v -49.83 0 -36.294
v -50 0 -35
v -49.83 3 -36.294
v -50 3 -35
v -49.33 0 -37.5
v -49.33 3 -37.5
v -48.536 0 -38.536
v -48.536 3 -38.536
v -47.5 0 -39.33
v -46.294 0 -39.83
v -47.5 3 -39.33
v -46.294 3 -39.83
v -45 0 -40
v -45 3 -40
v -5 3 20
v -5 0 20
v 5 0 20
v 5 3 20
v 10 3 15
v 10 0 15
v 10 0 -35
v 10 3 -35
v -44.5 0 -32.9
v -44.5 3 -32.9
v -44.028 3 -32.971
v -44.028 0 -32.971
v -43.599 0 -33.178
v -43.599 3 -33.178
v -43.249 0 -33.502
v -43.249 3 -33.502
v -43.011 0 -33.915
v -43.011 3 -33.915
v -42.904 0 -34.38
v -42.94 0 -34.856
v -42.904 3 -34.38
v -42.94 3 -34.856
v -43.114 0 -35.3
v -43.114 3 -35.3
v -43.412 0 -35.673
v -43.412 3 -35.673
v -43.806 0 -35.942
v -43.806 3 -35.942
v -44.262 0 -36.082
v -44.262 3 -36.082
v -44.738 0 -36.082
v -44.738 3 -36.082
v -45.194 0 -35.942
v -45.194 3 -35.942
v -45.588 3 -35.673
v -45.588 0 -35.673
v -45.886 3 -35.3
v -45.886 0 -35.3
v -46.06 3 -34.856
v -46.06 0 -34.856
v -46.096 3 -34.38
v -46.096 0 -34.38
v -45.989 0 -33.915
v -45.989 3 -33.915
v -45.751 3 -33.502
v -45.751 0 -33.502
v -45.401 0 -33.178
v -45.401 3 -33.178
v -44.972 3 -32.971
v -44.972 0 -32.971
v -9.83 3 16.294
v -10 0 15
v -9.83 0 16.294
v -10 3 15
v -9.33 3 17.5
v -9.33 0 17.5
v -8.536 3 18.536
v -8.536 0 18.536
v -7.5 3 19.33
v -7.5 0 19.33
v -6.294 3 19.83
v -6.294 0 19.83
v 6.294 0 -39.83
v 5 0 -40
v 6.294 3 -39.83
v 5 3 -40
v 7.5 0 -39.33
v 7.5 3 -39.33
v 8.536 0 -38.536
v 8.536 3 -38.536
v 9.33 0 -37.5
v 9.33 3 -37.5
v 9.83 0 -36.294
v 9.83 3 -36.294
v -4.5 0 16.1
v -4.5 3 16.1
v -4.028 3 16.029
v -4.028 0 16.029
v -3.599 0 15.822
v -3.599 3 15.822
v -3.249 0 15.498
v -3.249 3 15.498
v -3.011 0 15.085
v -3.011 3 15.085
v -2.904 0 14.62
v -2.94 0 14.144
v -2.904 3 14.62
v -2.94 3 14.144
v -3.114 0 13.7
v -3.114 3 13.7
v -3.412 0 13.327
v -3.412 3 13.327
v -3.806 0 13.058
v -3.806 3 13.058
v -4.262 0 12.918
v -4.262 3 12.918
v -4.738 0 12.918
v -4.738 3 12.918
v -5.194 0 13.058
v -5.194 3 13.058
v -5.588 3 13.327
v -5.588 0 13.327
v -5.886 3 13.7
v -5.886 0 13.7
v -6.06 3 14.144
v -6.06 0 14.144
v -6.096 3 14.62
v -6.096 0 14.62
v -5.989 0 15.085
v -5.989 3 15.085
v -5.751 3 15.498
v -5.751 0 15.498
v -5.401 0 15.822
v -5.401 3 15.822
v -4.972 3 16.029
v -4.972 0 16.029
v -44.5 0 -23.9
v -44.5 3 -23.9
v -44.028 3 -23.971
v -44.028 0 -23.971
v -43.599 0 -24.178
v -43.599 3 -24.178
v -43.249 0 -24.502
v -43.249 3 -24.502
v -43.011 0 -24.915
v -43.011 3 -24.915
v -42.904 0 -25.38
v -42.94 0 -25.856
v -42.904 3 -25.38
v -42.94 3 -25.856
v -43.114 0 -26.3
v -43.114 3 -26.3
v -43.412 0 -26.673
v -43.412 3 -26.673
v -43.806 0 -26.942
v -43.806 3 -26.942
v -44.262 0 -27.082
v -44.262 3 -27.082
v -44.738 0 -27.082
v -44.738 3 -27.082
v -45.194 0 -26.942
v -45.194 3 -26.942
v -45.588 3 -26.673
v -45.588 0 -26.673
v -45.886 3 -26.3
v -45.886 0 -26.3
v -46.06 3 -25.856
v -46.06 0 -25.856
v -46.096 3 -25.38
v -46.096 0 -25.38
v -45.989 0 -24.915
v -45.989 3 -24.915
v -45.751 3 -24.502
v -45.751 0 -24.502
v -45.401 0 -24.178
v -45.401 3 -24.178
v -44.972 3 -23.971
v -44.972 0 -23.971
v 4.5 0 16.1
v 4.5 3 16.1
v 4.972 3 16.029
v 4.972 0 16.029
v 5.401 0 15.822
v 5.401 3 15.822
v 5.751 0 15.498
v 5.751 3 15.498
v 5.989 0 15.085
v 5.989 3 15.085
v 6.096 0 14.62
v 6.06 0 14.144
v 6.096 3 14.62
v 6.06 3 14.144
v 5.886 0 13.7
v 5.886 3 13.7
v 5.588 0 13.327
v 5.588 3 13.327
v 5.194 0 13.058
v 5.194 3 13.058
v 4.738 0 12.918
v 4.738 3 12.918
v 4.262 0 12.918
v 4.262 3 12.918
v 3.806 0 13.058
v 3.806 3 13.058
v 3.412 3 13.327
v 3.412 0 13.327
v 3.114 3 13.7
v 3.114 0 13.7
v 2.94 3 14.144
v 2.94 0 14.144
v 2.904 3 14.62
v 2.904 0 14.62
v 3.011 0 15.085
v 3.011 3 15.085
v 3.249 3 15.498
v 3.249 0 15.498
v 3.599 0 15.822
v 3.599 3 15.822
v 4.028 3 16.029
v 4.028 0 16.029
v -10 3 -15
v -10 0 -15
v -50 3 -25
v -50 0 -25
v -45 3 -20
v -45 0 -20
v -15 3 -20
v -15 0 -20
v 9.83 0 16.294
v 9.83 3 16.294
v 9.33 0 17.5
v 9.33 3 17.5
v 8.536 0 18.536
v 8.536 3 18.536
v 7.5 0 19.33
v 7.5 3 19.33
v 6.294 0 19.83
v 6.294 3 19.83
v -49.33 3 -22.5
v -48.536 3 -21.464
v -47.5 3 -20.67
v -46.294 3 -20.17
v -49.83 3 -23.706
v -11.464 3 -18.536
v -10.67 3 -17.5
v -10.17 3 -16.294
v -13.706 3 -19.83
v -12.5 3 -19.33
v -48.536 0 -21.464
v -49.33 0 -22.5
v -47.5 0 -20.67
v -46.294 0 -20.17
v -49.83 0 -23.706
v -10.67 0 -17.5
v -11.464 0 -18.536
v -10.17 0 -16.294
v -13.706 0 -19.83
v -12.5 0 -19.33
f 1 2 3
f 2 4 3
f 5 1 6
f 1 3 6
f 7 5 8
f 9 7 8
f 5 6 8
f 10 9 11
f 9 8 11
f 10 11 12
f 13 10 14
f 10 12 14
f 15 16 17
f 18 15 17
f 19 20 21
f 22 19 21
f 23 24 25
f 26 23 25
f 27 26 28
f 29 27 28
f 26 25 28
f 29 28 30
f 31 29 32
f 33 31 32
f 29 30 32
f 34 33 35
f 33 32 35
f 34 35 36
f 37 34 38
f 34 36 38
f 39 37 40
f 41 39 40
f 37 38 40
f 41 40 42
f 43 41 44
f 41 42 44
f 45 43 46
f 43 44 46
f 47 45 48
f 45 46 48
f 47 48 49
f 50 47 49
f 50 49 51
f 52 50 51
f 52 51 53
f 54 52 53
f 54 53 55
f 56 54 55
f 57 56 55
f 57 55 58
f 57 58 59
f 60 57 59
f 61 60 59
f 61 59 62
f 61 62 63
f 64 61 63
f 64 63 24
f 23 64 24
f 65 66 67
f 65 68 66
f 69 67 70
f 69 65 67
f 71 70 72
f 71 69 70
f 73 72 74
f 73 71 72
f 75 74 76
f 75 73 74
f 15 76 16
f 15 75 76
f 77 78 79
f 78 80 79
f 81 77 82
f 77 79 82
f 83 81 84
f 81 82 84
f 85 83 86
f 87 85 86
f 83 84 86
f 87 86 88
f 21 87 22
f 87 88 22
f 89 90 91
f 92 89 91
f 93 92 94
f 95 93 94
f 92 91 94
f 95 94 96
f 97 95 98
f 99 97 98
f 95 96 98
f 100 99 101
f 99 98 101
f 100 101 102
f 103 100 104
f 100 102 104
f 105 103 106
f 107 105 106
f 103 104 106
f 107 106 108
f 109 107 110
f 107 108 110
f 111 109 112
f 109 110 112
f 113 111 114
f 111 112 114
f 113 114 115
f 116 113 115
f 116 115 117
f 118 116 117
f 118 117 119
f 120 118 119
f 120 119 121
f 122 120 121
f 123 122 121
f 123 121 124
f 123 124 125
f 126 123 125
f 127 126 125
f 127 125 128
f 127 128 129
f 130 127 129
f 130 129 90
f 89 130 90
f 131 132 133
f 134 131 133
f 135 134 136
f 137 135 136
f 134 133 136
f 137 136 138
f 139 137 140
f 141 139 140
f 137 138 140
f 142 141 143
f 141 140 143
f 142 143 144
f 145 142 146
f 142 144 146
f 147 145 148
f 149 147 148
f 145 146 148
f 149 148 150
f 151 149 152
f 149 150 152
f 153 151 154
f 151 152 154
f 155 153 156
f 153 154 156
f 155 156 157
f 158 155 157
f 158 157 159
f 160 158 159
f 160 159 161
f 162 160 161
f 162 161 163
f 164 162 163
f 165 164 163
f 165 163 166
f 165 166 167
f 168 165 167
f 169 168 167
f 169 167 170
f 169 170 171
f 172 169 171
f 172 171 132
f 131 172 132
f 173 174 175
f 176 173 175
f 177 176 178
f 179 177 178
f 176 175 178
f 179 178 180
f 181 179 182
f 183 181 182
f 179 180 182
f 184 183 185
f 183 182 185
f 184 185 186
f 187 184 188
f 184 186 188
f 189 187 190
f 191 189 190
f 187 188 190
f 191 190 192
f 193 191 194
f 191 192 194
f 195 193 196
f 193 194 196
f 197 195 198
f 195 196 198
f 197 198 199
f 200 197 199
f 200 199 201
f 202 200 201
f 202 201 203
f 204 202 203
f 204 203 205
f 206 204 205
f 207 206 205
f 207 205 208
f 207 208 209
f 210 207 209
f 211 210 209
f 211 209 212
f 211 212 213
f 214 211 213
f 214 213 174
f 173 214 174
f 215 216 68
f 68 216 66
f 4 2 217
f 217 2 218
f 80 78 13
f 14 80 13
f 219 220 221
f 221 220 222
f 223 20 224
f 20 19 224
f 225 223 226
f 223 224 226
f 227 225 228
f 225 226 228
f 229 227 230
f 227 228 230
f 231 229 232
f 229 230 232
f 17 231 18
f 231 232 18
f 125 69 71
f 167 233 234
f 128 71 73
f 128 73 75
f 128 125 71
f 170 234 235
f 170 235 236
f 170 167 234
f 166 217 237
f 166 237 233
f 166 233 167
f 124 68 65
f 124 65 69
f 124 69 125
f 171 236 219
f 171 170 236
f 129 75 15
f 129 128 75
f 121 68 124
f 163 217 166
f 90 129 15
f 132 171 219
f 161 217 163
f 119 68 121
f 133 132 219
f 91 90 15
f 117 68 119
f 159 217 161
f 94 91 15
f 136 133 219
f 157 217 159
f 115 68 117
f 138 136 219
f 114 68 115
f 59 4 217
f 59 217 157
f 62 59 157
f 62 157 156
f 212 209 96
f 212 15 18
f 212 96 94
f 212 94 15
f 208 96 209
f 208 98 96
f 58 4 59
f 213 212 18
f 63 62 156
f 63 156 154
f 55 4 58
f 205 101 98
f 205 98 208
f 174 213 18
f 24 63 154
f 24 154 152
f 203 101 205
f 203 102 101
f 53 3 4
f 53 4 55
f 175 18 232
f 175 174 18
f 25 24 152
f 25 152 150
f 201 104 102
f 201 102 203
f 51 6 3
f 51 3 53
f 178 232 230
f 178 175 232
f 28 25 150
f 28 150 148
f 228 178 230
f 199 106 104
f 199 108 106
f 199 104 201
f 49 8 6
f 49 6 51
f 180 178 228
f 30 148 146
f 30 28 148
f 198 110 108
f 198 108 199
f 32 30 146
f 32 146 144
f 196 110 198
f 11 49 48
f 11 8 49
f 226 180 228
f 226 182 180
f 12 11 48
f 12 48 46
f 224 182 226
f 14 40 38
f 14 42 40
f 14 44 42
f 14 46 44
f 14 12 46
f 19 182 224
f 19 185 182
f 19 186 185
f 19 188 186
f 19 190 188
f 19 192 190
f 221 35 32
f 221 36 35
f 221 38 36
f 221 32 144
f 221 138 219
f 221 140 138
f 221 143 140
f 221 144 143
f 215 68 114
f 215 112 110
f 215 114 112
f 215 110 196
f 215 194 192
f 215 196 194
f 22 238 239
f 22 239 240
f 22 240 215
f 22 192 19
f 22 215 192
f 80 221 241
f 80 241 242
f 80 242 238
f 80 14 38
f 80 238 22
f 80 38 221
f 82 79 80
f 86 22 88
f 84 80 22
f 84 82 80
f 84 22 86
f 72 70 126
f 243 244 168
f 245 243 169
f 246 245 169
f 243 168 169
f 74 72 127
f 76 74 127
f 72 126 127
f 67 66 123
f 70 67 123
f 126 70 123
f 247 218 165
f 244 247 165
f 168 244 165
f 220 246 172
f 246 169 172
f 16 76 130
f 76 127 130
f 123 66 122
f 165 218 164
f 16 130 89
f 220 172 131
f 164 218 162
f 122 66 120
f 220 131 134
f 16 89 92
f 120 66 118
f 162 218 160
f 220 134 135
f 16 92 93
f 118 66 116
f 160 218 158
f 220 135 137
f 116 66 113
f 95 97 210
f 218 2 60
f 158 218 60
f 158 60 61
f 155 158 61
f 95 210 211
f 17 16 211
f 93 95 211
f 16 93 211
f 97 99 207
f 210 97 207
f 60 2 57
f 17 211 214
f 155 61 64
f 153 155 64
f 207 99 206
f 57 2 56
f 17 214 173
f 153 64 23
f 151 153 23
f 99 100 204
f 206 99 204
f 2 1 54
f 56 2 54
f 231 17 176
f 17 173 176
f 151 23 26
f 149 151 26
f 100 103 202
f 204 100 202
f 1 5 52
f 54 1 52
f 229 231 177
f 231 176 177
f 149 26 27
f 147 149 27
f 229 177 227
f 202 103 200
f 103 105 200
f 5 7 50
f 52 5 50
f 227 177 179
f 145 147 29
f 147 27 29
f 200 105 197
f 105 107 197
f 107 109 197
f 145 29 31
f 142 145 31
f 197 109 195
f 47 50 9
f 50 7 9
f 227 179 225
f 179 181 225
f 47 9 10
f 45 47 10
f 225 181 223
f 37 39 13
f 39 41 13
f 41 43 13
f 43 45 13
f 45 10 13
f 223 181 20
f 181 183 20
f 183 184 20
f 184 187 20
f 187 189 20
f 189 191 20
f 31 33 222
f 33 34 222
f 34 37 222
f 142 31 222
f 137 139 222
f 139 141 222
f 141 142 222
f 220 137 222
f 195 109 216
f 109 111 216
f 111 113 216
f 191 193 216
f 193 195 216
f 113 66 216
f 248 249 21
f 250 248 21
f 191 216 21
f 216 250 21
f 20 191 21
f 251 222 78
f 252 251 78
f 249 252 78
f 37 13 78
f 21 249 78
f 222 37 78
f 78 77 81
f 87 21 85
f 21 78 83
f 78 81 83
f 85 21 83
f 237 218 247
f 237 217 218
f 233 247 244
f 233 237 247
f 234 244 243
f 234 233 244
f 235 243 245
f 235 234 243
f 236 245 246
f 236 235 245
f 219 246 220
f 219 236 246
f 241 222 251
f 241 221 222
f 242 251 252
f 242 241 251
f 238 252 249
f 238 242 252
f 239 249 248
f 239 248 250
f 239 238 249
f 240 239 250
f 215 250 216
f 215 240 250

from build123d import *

# Parameters (mm, degrees)
EXTRUDE_1_DEPTH     = 3
SKETCH_2_R          = 1.6
CUT_EXTRUDE_1_DEPTH = 65.101482042
FILLET_1_R          = 5


with BuildPart() as part:
    # 草图1 → 凸台-拉伸1 (new body)
    with BuildSketch(Plane(origin=(0, 0, 0), x_dir=(1, 0, 0), z_dir=(0, 1, 0))):
        Polygon((-50, 40), (-50, 20), (-10, 20), (-10, -20), (10, -20), (10, 40), align=None)
    extrude(amount=EXTRUDE_1_DEPTH)

    # 草图2 → 切除-拉伸1 (cut, through all)
    with BuildSketch(Plane(origin=(0, 3, 0), x_dir=(1, 0, 0), z_dir=(0, 1, 0))):
        with Locations(Location((-44.5, 34.5, 0), (0, 0, 270))):
            Circle(SKETCH_2_R)
        with Locations(Location((-44.5, 25.5, 0), (0, 0, 270))):
            Circle(SKETCH_2_R)
        with Locations(Location((-4.5, -14.5, 0), (0, 0, 270))):
            Circle(SKETCH_2_R)
        with Locations(Location((4.5, -14.5, 0), (0, 0, 270))):
            Circle(SKETCH_2_R)
    extrude(amount=-CUT_EXTRUDE_1_DEPTH, mode=Mode.SUBTRACT)

    # 圆角1
    fillet_1_edges = [part.edges().sort_by_distance(p)[0] for p in [
        (10, 1.5, 20),
        (-10, 1.5, 20),
        (-10, 1.5, -20),
        (-50, 1.5, -20),
        (-50, 1.5, -40),
        (10, 1.5, -40),
    ]]
    fillet(fillet_1_edges, radius=FILLET_1_R)


solid = part.part
